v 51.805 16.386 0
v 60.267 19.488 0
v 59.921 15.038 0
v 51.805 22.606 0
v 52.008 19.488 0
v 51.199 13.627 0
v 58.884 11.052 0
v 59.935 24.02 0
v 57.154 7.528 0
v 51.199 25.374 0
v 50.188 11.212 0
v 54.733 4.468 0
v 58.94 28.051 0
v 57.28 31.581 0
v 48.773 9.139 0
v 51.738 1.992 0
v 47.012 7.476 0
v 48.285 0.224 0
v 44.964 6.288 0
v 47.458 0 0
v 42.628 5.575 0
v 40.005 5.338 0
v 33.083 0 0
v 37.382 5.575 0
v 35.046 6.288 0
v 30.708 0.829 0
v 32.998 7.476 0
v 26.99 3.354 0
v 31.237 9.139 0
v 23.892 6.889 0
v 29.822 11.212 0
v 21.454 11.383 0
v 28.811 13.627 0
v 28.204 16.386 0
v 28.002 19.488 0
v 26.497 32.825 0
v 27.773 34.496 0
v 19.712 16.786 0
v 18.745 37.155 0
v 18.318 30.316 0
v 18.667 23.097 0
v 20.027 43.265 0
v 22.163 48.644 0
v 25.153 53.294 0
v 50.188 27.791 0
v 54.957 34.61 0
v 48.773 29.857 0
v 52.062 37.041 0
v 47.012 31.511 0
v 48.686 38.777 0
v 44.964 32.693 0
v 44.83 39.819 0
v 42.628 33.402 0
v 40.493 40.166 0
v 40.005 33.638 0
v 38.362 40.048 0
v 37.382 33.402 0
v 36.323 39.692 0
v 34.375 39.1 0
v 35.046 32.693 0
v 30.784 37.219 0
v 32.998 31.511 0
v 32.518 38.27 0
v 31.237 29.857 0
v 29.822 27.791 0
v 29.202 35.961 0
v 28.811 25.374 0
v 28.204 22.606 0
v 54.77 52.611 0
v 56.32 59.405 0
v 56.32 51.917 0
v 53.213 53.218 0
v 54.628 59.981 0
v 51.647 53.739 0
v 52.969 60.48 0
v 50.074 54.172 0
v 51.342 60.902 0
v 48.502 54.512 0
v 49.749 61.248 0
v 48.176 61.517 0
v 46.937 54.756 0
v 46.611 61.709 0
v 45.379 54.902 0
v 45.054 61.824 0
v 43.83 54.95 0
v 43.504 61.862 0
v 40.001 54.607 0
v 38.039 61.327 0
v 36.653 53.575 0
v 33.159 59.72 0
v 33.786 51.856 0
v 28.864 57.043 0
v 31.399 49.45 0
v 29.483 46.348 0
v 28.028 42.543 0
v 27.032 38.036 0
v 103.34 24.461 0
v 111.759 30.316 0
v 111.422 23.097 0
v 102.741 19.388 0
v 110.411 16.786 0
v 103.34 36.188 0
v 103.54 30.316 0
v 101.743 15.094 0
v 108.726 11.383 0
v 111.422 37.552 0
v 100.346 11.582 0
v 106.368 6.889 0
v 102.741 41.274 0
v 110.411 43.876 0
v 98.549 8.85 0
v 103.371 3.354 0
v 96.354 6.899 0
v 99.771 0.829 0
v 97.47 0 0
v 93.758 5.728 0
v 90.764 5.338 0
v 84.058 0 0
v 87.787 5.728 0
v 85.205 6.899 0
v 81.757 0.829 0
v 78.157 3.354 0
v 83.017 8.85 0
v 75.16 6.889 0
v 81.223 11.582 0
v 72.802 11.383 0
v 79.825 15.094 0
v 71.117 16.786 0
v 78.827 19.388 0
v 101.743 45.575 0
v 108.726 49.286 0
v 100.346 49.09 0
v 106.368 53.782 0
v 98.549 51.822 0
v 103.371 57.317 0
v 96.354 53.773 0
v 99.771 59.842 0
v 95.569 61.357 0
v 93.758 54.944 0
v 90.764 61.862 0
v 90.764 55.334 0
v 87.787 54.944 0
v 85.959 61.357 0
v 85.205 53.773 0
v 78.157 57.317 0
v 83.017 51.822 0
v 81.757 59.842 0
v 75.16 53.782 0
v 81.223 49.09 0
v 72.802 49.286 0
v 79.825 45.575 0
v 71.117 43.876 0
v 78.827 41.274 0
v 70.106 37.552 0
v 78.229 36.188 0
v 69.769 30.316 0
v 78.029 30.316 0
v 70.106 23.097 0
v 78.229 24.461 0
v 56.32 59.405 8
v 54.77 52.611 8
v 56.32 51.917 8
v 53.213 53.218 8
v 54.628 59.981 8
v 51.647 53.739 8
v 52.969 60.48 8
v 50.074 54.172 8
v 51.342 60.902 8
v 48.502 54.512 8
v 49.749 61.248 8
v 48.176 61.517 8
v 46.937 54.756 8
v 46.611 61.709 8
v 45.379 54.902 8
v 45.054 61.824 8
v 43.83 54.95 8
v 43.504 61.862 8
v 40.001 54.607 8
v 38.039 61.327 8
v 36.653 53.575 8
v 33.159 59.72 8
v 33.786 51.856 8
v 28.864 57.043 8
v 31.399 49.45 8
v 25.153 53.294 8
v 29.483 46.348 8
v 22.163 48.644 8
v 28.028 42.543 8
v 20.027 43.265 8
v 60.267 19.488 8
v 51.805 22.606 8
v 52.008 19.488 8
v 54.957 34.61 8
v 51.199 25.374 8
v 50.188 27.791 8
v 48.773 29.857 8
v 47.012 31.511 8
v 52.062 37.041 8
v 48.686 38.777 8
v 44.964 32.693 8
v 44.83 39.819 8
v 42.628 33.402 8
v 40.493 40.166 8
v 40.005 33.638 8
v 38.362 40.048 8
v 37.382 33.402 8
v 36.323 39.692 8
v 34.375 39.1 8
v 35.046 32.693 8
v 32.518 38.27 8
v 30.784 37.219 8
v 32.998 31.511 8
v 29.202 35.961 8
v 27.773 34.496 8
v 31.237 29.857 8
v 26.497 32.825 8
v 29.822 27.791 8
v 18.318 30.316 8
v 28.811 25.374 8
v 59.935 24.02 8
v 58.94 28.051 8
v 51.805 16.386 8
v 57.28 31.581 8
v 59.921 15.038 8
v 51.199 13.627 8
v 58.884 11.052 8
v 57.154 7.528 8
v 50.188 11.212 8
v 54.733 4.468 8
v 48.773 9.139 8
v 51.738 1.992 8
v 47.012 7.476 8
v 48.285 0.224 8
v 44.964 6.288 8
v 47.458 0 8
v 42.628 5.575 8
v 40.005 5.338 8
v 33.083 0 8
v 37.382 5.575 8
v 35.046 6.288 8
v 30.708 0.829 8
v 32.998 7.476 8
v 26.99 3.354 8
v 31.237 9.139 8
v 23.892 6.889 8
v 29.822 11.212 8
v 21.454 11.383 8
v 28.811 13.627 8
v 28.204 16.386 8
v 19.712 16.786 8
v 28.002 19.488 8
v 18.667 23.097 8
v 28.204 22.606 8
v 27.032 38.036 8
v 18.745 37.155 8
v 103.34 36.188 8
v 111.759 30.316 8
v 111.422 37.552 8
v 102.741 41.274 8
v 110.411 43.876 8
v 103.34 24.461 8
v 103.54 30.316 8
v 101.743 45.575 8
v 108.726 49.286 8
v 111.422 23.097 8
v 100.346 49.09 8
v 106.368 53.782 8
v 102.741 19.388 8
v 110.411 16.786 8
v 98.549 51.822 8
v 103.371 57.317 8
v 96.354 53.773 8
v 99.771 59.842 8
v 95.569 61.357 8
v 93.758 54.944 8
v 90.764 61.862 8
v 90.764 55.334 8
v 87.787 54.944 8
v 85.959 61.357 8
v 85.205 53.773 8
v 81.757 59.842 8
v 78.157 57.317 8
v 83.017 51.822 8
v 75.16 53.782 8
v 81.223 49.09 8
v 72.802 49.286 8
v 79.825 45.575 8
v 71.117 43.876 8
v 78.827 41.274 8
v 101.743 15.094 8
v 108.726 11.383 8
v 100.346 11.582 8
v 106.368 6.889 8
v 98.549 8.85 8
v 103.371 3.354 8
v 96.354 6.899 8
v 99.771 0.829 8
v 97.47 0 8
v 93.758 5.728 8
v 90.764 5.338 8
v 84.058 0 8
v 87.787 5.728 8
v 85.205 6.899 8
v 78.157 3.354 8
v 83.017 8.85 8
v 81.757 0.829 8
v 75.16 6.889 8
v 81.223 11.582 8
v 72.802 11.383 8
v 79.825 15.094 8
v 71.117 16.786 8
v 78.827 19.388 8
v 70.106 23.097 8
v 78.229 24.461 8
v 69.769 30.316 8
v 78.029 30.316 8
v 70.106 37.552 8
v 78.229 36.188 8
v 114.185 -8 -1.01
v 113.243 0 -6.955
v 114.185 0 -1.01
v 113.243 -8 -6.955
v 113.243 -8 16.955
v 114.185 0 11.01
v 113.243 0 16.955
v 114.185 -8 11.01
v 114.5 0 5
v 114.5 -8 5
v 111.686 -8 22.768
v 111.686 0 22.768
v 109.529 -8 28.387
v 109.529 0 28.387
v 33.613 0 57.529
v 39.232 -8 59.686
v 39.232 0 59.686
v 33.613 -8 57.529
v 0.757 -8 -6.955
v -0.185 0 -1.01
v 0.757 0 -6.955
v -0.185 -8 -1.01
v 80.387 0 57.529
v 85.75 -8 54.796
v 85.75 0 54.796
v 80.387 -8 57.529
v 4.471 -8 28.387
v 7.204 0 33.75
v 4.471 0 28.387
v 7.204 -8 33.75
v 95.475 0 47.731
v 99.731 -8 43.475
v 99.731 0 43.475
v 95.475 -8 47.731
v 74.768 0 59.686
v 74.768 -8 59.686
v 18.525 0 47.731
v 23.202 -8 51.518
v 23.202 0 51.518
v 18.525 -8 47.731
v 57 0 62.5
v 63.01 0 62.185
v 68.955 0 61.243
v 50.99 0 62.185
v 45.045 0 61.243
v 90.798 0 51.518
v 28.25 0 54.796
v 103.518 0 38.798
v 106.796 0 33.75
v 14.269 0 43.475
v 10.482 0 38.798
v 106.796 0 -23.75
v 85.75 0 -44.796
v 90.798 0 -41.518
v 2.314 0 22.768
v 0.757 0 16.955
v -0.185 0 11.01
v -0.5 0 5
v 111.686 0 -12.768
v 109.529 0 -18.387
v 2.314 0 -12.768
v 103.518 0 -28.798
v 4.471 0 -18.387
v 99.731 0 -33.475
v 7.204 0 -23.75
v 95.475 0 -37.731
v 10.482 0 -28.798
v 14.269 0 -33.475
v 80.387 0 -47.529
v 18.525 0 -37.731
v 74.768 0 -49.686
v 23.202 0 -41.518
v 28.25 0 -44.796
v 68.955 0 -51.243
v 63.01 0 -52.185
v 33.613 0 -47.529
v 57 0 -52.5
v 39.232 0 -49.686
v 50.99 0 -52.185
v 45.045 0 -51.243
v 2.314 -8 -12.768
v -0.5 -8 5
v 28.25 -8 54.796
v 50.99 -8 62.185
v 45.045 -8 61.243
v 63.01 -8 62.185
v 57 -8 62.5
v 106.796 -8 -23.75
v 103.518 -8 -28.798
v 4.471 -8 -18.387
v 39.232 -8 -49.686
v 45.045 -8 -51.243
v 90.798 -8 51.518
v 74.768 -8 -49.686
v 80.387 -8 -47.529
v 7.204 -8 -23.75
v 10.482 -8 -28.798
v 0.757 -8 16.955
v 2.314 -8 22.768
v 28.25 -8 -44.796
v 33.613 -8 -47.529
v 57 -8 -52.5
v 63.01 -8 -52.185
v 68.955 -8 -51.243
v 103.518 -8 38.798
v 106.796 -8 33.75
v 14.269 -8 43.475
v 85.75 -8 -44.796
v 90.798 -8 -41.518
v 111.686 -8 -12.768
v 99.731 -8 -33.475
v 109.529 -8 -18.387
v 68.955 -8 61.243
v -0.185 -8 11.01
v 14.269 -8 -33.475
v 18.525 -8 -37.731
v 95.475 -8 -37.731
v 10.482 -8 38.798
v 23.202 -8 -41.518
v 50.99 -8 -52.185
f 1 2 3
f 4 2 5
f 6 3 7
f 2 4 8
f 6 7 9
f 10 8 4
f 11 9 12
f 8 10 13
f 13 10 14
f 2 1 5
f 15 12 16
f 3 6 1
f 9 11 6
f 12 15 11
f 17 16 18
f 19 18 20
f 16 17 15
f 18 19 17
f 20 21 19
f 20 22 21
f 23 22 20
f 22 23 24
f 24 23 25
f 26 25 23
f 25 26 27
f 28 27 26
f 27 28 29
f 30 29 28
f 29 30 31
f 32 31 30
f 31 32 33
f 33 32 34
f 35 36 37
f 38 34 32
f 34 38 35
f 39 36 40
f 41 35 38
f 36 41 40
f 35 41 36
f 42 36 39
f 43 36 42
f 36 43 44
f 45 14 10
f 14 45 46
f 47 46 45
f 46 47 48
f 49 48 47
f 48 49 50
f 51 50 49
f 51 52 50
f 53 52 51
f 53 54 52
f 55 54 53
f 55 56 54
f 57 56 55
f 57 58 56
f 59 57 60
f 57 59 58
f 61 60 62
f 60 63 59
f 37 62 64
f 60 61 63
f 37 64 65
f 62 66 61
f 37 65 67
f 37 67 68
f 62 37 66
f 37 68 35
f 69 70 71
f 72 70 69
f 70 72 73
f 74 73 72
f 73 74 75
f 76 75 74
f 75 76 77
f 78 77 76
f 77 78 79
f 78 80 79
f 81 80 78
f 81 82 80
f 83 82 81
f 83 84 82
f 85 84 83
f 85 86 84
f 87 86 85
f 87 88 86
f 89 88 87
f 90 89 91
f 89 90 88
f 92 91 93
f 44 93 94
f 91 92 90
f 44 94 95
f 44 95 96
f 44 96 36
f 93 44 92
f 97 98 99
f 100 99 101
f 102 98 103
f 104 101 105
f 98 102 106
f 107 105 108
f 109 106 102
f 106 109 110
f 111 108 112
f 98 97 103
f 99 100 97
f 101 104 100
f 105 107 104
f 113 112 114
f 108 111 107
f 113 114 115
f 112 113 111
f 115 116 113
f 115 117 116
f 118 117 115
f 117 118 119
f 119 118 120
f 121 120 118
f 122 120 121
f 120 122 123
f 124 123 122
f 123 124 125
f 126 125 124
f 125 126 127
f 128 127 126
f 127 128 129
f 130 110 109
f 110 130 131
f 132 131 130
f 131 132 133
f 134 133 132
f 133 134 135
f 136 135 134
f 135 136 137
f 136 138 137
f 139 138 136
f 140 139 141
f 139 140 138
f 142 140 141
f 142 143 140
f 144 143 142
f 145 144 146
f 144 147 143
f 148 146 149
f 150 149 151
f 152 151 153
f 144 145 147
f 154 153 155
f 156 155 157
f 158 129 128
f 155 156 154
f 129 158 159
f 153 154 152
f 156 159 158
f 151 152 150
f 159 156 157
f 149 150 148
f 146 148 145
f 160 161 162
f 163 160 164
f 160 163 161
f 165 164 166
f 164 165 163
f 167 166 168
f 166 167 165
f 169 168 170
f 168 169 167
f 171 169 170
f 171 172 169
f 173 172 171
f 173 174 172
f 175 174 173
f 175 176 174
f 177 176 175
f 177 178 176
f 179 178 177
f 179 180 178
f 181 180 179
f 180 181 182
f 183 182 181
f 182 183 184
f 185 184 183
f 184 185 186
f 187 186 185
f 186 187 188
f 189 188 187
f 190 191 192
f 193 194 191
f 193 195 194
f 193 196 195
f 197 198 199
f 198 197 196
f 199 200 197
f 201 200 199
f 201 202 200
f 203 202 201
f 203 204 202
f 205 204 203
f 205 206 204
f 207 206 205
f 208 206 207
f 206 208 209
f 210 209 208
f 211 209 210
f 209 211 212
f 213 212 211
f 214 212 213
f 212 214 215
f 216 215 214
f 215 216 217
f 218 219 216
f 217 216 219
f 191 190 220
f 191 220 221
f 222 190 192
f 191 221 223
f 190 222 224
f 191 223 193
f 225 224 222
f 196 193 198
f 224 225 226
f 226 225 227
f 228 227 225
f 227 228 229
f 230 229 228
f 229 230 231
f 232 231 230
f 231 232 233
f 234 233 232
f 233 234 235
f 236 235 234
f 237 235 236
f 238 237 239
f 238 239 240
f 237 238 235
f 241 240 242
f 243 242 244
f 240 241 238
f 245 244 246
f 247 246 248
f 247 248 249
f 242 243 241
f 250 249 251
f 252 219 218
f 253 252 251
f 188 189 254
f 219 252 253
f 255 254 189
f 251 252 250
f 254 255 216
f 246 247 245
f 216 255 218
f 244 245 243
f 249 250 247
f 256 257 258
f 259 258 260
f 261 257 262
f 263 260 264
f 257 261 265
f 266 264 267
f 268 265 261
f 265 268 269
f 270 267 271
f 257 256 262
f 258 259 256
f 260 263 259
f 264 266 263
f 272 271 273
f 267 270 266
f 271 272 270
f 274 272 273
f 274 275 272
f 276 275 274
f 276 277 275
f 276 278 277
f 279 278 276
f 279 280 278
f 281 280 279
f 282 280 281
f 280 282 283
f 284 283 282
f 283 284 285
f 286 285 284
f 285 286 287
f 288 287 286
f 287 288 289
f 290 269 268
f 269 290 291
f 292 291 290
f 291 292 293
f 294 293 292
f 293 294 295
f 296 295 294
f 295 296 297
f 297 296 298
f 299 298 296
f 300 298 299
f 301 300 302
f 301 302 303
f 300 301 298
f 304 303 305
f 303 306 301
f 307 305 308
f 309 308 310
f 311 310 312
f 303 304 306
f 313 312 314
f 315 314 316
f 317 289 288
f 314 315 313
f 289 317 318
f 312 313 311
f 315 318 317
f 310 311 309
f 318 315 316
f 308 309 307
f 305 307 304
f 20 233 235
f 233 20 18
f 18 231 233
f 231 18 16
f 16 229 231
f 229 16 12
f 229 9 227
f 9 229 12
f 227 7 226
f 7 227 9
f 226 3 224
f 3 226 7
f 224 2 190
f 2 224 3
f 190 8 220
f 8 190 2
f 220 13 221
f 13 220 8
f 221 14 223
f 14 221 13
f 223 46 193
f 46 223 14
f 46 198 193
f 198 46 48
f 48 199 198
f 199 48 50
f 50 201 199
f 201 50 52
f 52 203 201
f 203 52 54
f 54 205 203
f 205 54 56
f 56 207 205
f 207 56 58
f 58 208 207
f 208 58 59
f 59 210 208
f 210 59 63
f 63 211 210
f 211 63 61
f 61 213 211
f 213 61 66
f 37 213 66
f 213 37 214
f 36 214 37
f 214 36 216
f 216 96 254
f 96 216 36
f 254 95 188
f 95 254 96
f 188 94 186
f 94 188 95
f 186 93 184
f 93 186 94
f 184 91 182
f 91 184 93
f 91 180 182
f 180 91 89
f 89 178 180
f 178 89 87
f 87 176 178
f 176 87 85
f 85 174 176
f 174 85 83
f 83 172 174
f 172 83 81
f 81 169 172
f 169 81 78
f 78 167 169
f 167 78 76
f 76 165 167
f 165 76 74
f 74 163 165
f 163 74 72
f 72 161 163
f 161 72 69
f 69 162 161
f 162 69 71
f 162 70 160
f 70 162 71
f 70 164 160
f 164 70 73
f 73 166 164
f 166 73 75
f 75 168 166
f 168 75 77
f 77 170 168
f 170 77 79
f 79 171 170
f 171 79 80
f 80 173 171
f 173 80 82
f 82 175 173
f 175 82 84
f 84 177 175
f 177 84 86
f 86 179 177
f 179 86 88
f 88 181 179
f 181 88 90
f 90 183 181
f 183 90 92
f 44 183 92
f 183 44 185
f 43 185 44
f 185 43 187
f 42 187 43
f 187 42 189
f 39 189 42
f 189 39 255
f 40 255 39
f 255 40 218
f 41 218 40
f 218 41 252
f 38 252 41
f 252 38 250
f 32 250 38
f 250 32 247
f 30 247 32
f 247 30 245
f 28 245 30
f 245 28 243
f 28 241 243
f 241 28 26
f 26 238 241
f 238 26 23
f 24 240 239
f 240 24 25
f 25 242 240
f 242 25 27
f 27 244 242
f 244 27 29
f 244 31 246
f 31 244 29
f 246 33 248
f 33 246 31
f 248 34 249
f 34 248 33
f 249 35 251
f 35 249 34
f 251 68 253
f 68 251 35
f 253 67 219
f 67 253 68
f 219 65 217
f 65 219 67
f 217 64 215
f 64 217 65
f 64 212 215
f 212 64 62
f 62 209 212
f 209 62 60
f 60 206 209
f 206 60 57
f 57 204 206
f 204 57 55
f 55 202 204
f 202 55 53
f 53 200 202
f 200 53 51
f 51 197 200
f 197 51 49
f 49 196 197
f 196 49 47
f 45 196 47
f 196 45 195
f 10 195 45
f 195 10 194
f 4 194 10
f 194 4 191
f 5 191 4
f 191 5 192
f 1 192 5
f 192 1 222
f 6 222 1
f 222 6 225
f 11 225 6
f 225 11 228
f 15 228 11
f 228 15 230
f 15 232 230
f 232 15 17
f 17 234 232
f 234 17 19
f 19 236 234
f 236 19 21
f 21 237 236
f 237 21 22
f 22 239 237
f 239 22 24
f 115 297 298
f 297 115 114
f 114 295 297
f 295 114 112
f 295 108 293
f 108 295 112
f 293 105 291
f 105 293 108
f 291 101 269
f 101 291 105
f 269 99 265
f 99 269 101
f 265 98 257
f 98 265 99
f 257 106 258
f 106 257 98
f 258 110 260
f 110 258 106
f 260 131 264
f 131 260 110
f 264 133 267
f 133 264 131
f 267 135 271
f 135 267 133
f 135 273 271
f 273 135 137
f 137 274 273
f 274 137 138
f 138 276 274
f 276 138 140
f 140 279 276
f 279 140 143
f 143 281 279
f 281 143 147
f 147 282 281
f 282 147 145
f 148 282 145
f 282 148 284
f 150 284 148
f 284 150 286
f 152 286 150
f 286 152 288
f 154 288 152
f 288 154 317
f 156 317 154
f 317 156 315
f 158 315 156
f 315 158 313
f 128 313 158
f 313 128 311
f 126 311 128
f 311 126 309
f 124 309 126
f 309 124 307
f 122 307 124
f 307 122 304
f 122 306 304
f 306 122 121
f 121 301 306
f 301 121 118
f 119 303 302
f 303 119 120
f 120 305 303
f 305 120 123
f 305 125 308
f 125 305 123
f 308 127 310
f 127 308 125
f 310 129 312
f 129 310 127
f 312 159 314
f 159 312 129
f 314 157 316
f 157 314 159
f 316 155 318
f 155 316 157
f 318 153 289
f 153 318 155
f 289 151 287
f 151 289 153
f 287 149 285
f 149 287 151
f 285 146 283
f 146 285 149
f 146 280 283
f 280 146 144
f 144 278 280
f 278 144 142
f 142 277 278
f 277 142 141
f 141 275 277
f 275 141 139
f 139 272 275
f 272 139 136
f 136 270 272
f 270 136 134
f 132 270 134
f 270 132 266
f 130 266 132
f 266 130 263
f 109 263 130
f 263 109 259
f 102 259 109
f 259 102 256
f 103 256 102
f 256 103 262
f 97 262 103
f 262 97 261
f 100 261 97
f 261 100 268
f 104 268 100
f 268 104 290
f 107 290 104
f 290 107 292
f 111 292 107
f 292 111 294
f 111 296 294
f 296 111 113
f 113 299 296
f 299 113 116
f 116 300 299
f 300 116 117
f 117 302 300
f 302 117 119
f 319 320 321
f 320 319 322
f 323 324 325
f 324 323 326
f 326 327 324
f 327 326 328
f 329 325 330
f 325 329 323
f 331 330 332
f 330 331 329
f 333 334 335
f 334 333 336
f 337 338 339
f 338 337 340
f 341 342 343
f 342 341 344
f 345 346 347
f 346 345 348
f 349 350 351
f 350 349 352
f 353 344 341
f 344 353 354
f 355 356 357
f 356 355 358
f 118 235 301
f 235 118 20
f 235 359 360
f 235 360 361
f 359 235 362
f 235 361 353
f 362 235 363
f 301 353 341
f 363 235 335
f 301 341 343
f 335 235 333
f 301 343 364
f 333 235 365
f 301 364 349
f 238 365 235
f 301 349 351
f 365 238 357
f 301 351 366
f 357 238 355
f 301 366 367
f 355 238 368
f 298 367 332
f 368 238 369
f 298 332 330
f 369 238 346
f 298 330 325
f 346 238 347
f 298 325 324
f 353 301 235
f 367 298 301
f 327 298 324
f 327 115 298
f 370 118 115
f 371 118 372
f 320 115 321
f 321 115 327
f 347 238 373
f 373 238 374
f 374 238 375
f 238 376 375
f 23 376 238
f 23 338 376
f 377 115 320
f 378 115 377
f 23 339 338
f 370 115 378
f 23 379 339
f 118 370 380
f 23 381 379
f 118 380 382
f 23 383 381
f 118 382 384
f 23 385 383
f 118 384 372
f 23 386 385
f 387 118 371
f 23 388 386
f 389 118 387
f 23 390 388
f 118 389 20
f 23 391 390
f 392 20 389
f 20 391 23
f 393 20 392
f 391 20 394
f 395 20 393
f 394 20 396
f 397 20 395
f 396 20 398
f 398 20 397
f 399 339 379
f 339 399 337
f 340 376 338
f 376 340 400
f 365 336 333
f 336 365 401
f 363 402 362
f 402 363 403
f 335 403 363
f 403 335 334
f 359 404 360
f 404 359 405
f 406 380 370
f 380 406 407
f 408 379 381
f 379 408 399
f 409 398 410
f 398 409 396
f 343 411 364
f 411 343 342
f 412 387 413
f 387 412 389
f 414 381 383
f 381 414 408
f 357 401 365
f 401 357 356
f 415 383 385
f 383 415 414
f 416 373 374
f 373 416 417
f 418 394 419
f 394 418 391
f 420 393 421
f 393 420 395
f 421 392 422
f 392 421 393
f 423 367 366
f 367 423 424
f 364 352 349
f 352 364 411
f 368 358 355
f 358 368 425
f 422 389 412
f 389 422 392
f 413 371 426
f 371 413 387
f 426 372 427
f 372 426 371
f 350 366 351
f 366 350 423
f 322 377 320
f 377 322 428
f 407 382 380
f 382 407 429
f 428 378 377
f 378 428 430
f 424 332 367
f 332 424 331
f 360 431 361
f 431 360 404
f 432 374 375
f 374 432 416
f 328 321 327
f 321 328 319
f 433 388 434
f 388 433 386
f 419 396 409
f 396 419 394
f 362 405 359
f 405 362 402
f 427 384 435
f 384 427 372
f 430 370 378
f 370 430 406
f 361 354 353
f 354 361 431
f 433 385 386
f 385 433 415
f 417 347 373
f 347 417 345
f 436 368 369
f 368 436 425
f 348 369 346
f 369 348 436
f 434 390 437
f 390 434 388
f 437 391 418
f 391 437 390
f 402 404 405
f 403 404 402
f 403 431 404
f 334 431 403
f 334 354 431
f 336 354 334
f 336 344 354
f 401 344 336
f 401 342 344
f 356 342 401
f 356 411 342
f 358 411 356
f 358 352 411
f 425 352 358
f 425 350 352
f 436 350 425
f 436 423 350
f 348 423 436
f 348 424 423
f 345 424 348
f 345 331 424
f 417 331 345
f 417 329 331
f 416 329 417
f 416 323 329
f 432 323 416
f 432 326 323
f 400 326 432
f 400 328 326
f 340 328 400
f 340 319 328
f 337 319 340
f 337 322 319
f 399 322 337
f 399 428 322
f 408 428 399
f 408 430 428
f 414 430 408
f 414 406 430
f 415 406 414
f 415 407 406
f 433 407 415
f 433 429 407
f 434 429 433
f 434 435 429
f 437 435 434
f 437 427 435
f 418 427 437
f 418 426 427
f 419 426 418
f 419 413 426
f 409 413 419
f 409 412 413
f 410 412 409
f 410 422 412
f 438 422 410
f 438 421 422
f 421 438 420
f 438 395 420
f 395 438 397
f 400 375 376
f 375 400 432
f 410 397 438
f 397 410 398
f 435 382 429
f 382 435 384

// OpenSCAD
//  Nummer


module Nummer ()
{
    translate([12.5,0,0])
    linear_extrude(8)
    text("60",size=60, font="Bauhaus 93");
    translate([57,0,5])
    rotate([90,0,0])
    cylinder(d=115,h=8, $fn=60);
}

Nummer();
